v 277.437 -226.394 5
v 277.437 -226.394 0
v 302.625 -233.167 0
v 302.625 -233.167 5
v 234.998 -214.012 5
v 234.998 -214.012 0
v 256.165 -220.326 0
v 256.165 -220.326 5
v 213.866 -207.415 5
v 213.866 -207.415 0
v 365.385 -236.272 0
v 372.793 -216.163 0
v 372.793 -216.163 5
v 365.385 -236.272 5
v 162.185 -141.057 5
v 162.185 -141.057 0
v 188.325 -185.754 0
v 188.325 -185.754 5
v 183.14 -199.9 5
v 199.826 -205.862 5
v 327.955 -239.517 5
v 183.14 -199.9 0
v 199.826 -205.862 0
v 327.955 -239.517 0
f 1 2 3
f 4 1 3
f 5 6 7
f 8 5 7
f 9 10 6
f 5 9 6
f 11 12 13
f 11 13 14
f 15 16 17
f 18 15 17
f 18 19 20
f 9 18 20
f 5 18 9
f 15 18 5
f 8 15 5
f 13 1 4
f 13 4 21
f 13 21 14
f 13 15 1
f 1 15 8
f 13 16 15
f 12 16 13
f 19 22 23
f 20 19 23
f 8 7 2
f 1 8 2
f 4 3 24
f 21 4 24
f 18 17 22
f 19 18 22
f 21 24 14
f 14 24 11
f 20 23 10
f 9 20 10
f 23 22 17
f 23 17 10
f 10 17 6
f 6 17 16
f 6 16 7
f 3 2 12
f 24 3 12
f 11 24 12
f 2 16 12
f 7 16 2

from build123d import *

# Parameters (mm, degrees)
PAD004_DEPTH = 5


with BuildPart() as part:
    # Sketch004 → Pad004 (new body)
    with BuildSketch(Plane.XY):
        with BuildLine():
            add(Edge.make_bspline(
                [(183.139549, -199.900438), (199.825938, -205.862382)],
                knots=[0, 0, 50.228478, 50.228478], degree=1))
            add(Edge.make_bspline(
                [(199.825938, -205.862382), (213.866493, -207.414604)],
                knots=[0, 0, 40.042477, 40.042477], degree=1))
            add(Edge.make_bspline(
                [(213.866493, -207.414604), (234.997882, -214.011549)],
                knots=[0, 0, 62.751096, 62.751096], degree=1))
            add(Edge.make_bspline(
                [(234.997882, -214.011549), (256.164548, -220.326271)],
                knots=[0, 0, 62.613178, 62.613178], degree=1))
            add(Edge.make_bspline(
                [(256.164548, -220.326271), (277.437047, -226.394048)],
                knots=[0, 0, 62.705103, 62.705103], degree=1))
            add(Edge.make_bspline(
                [(277.437047, -226.394048), (302.62538, -233.167382)],
                knots=[0, 0, 73.936459, 73.936459], degree=1))
            add(Edge.make_bspline(
                [(302.62538, -233.167382), (327.954824, -239.517381)],
                knots=[0, 0, 74.021889, 74.021889], degree=1))
            add(Edge.make_bspline(
                [(327.954824, -239.517381), (365.384545, -236.271826)],
                knots=[0, 0, 106.498122, 106.498122], degree=1))
            add(Edge.make_bspline(
                [(372.792878, -216.163493), (365.384545, -236.271826)],
                knots=[0, 0, 60.74537, 60.74537], degree=1))
            add(Edge.make_bspline(
                [(162.18455, -141.057106), (372.792878, -216.163493)],
                knots=[0, 0, 633.826009, 633.826009], degree=1))
            add(Edge.make_bspline(
                [(162.18455, -141.057106), (188.325383, -185.754049)],
                knots=[0, 0, 146.777723, 146.777723], degree=1))
            add(Edge.make_bspline(
                [(188.325383, -185.754049), (183.139549, -199.900438)],
                knots=[0, 0, 42.709484, 42.709484], degree=1))
        make_face()
    extrude(amount=PAD004_DEPTH)


solid = part.part
